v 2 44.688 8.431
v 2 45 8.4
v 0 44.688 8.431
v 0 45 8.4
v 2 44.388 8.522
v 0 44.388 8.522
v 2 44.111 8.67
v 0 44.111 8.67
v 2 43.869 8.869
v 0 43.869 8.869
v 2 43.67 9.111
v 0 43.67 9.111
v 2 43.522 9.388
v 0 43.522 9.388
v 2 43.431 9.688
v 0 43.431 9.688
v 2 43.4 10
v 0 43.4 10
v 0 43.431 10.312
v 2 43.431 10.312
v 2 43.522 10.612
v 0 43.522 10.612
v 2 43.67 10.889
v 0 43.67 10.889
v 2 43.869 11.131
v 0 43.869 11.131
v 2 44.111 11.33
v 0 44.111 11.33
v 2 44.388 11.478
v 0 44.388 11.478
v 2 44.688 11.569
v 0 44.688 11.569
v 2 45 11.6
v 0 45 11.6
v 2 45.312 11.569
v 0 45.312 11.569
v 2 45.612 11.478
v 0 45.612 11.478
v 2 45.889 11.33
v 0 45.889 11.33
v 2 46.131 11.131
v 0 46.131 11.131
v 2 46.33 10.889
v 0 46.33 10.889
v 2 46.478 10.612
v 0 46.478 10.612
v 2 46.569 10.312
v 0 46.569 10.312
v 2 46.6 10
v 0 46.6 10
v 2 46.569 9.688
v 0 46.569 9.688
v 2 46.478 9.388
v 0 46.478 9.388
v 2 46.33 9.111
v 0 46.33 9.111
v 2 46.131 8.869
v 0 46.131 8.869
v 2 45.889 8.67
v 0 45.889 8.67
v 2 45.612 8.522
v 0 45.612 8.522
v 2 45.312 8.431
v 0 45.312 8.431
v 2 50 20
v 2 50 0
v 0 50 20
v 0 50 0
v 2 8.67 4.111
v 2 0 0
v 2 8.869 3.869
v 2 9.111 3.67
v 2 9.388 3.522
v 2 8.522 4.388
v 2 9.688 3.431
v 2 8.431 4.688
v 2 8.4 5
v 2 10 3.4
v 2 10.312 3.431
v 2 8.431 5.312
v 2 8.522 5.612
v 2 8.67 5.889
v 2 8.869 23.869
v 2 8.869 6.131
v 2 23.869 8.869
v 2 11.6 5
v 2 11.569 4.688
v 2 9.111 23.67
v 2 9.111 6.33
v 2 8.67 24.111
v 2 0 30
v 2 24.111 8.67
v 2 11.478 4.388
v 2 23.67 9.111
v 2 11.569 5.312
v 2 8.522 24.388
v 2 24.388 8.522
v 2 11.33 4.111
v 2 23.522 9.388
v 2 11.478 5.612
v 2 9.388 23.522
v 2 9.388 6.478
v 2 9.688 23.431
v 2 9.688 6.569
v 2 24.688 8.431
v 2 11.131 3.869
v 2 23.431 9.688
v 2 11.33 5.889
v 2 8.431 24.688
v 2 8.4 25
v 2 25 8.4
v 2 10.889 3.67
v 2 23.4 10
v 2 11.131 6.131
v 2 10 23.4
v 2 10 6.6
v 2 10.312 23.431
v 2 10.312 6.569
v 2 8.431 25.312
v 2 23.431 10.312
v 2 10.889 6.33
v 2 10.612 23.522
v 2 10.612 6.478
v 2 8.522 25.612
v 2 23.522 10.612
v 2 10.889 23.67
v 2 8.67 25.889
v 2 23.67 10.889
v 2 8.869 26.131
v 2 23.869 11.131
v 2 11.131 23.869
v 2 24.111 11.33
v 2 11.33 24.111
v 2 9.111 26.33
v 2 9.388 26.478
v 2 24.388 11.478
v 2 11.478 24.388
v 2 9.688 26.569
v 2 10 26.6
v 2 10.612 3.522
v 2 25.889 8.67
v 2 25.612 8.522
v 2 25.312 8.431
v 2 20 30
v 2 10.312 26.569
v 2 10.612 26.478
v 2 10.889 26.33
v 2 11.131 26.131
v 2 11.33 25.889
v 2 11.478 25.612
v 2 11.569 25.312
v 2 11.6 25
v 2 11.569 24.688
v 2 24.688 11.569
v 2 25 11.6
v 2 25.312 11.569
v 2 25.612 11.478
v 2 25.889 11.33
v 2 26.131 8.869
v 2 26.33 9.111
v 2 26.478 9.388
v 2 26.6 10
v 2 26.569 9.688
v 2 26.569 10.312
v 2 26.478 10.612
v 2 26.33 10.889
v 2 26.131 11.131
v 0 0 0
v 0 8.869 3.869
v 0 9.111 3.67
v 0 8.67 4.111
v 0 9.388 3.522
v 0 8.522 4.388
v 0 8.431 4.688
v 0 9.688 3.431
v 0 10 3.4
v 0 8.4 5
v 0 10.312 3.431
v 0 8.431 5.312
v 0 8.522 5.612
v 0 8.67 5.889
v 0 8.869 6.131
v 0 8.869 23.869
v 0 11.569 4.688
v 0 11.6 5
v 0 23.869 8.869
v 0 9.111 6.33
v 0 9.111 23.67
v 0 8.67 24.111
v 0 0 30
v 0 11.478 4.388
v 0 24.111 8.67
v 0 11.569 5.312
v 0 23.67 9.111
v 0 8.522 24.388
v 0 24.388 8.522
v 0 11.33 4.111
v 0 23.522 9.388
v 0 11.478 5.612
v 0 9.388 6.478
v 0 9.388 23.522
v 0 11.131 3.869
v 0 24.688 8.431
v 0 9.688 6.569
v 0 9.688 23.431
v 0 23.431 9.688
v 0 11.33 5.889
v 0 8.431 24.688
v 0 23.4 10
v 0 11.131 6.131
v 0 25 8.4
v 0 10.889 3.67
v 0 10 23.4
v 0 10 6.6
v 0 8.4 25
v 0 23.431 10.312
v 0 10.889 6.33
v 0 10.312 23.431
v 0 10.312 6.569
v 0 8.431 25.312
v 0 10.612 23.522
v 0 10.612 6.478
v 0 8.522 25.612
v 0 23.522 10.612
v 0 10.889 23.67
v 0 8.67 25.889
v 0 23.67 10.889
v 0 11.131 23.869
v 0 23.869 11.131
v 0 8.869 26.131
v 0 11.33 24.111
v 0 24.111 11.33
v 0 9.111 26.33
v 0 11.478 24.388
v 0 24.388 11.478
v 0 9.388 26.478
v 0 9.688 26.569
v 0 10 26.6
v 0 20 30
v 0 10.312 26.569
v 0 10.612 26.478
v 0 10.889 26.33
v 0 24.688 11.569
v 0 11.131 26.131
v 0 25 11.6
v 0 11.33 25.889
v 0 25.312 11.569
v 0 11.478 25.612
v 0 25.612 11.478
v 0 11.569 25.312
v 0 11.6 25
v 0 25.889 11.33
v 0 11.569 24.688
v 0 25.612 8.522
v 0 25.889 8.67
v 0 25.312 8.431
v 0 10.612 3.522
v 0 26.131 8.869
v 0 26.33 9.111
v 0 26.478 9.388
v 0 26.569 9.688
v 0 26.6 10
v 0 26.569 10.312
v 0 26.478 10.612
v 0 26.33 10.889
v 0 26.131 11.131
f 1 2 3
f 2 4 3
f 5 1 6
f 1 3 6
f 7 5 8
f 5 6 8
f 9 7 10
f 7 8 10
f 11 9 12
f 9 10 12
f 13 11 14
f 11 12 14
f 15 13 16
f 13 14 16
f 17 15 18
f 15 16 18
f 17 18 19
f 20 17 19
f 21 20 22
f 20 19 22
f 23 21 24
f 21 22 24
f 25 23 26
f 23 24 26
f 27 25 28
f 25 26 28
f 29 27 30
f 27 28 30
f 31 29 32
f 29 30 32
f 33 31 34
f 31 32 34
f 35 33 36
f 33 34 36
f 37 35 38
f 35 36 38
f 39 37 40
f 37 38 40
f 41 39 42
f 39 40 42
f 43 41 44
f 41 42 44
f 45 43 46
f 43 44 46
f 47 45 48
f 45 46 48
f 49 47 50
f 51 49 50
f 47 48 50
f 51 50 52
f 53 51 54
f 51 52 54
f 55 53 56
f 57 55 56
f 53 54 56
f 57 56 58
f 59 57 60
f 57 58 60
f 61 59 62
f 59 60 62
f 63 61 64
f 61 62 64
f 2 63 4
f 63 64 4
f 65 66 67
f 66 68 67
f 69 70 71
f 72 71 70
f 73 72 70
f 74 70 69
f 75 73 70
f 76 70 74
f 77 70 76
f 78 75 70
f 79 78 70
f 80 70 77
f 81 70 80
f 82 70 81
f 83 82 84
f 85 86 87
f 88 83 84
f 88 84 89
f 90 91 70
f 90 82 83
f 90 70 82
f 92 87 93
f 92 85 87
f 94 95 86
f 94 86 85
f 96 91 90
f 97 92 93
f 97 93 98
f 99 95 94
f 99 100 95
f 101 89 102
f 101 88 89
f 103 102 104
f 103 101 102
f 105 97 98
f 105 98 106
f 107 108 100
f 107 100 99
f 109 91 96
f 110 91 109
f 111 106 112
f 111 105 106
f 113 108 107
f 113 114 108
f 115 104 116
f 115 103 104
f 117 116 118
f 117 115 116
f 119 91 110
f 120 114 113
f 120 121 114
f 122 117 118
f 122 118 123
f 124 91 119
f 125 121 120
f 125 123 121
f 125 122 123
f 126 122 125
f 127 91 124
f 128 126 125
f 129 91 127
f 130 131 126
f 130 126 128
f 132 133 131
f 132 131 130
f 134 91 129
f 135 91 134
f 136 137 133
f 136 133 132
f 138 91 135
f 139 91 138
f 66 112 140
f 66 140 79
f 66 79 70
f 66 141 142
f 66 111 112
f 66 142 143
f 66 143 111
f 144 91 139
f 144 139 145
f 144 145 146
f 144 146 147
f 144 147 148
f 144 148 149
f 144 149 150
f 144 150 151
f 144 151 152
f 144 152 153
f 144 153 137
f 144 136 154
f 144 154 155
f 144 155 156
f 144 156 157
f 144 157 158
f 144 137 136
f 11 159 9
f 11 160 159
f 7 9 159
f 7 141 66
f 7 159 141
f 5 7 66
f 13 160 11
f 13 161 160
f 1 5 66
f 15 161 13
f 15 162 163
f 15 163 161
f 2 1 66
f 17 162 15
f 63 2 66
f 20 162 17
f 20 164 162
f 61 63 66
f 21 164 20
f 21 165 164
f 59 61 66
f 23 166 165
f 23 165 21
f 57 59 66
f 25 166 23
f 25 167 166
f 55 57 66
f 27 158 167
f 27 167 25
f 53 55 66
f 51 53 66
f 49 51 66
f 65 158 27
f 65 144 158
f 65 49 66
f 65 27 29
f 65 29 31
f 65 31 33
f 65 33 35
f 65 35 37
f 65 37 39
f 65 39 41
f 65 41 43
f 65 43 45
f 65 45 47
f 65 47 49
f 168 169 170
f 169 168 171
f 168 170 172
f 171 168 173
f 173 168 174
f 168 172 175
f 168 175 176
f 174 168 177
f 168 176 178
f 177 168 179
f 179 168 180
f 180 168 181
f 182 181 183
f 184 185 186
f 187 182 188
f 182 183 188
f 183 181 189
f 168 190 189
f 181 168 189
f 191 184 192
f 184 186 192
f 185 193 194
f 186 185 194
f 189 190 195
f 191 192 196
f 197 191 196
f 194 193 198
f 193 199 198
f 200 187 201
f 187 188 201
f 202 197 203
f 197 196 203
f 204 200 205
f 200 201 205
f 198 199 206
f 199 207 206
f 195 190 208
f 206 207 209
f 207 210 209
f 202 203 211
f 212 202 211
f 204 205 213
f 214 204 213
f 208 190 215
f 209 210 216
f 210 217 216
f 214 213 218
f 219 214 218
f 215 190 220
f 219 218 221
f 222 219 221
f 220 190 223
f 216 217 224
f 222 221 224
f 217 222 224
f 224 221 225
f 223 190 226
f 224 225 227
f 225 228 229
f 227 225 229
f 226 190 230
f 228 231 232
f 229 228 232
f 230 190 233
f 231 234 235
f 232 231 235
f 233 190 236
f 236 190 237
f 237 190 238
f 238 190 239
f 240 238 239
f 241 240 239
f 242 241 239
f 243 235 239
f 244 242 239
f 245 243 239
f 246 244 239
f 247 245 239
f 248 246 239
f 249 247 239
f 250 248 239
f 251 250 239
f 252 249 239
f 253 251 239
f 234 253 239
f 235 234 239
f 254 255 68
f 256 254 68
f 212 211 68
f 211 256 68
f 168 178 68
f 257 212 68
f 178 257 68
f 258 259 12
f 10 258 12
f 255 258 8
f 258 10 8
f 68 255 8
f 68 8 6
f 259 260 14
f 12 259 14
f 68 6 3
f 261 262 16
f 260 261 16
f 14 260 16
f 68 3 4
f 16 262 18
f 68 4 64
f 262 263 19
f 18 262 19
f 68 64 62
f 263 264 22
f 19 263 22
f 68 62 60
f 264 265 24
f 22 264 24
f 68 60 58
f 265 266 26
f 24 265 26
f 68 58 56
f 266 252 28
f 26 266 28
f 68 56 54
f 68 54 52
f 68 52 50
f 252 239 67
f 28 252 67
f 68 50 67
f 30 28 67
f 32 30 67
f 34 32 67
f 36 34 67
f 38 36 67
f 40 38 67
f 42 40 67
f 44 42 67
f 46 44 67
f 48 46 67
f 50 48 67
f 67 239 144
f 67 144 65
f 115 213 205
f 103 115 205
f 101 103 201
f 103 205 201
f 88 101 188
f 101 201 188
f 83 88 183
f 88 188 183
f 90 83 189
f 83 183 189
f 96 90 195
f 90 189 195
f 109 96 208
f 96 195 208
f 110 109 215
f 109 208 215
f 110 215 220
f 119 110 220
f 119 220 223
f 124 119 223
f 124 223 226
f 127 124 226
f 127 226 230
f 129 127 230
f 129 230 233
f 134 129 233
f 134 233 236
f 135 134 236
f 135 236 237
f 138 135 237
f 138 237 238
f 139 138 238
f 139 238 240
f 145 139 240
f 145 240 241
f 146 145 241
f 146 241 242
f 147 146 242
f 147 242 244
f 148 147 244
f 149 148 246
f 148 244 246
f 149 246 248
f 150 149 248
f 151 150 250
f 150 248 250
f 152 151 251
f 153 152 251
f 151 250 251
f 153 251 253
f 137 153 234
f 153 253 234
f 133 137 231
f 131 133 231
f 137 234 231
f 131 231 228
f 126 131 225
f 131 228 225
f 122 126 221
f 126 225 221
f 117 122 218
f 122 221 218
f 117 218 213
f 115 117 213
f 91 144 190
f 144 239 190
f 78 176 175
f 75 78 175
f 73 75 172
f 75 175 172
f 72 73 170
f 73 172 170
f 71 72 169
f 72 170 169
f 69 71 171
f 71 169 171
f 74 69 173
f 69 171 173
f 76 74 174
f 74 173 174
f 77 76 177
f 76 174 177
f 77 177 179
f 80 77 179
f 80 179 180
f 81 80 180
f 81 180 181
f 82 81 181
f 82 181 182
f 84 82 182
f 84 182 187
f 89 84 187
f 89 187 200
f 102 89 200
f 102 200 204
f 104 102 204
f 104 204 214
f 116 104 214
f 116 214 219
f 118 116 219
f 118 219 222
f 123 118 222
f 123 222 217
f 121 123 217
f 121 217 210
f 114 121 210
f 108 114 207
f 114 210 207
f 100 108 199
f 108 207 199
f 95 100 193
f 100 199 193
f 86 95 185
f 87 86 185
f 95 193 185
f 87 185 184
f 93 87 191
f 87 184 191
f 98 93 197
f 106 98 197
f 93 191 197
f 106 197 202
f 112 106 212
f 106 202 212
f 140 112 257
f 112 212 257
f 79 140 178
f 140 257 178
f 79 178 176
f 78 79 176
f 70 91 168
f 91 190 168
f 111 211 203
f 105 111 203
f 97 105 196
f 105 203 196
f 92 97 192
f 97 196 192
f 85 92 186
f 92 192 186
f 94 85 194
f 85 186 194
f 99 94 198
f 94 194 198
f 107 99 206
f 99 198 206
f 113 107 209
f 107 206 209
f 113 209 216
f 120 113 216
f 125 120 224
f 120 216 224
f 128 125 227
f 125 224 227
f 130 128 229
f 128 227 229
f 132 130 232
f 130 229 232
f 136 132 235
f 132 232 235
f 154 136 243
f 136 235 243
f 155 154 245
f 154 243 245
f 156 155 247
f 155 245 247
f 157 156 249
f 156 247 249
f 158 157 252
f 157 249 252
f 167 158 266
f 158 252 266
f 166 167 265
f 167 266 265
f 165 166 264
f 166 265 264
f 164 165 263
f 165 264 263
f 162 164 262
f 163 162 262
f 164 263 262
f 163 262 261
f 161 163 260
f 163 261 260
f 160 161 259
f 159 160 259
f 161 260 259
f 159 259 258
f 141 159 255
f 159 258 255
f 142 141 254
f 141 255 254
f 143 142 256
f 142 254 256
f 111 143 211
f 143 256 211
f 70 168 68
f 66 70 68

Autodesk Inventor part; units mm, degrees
ref_plane "YZ Plane" through (0, 0, 0) normal (1, 0, 0) x (0, 1, 0)
ref_plane "XZ Plane" through (0, 0, 0) normal (0, 1, 0) x (-1, 0, 0)
ref_plane "XY Plane" through (0, 0, 0) normal (0, 0, 1) x (1, 0, 0)
sketch "スケッチ1" plane through (0, 0, 0) normal (1, 0, 0) x (0, 1, 0)
  line L0 (0, 0) -> (50, 0)
  line L1 (50, 0) -> (50, 20)
  line L2 (50, 20) -> (0, 20) construction
  line L3 (0, 20) -> (0, 0)
  line L4 (0, 0) -> (20, 0)
  line L5 (20, 0) -> (20, 30) construction
  line L6 (20, 30) -> (0, 30)
  line L7 (0, 30) -> (0, 0)
  line L8 (20, 30) -> (50, 20)
  dimension "d0" = 20
  dimension "d1" = 20
  dimension "d2" = 30
  dimension "d3" = 30
extrude "押し出し1" add sketch "スケッチ1" along normal blind 2
sketch "スケッチ2" plane through (2, 0, 0) normal (1, 0, 0) x (0, 0, -1)
  line L0 (-30, 20) -> (-30, 0) projected
  line L1 (-30, 10) -> (0, 10) construction
  line L2 (0, 0) -> (0, 50) projected
  line L3 (0, 50) -> (-20, 50) projected
  line L4 (-10, 50) -> (-10, 0) construction
  line L5 (-30, 0) -> (0, 0) projected
  point P0 (-25, 10)
  point P1 (-5, 10)
  point P2 (-10, 25)
  point P3 (-10, 45)
  dimension "d6" = 20
  dimension "d7" = 5
  dimension "d8" = 20
  dimension "d9" = 5
hole "穴1" at (2, 10, 25) at (2, 10, 5) at (2, 25, 10) at (2, 45, 10) direction (-1, 0, 0) diameter 3.2 end through all
properties part number "FrameJoint2020" material "アルミニウム 6061"
